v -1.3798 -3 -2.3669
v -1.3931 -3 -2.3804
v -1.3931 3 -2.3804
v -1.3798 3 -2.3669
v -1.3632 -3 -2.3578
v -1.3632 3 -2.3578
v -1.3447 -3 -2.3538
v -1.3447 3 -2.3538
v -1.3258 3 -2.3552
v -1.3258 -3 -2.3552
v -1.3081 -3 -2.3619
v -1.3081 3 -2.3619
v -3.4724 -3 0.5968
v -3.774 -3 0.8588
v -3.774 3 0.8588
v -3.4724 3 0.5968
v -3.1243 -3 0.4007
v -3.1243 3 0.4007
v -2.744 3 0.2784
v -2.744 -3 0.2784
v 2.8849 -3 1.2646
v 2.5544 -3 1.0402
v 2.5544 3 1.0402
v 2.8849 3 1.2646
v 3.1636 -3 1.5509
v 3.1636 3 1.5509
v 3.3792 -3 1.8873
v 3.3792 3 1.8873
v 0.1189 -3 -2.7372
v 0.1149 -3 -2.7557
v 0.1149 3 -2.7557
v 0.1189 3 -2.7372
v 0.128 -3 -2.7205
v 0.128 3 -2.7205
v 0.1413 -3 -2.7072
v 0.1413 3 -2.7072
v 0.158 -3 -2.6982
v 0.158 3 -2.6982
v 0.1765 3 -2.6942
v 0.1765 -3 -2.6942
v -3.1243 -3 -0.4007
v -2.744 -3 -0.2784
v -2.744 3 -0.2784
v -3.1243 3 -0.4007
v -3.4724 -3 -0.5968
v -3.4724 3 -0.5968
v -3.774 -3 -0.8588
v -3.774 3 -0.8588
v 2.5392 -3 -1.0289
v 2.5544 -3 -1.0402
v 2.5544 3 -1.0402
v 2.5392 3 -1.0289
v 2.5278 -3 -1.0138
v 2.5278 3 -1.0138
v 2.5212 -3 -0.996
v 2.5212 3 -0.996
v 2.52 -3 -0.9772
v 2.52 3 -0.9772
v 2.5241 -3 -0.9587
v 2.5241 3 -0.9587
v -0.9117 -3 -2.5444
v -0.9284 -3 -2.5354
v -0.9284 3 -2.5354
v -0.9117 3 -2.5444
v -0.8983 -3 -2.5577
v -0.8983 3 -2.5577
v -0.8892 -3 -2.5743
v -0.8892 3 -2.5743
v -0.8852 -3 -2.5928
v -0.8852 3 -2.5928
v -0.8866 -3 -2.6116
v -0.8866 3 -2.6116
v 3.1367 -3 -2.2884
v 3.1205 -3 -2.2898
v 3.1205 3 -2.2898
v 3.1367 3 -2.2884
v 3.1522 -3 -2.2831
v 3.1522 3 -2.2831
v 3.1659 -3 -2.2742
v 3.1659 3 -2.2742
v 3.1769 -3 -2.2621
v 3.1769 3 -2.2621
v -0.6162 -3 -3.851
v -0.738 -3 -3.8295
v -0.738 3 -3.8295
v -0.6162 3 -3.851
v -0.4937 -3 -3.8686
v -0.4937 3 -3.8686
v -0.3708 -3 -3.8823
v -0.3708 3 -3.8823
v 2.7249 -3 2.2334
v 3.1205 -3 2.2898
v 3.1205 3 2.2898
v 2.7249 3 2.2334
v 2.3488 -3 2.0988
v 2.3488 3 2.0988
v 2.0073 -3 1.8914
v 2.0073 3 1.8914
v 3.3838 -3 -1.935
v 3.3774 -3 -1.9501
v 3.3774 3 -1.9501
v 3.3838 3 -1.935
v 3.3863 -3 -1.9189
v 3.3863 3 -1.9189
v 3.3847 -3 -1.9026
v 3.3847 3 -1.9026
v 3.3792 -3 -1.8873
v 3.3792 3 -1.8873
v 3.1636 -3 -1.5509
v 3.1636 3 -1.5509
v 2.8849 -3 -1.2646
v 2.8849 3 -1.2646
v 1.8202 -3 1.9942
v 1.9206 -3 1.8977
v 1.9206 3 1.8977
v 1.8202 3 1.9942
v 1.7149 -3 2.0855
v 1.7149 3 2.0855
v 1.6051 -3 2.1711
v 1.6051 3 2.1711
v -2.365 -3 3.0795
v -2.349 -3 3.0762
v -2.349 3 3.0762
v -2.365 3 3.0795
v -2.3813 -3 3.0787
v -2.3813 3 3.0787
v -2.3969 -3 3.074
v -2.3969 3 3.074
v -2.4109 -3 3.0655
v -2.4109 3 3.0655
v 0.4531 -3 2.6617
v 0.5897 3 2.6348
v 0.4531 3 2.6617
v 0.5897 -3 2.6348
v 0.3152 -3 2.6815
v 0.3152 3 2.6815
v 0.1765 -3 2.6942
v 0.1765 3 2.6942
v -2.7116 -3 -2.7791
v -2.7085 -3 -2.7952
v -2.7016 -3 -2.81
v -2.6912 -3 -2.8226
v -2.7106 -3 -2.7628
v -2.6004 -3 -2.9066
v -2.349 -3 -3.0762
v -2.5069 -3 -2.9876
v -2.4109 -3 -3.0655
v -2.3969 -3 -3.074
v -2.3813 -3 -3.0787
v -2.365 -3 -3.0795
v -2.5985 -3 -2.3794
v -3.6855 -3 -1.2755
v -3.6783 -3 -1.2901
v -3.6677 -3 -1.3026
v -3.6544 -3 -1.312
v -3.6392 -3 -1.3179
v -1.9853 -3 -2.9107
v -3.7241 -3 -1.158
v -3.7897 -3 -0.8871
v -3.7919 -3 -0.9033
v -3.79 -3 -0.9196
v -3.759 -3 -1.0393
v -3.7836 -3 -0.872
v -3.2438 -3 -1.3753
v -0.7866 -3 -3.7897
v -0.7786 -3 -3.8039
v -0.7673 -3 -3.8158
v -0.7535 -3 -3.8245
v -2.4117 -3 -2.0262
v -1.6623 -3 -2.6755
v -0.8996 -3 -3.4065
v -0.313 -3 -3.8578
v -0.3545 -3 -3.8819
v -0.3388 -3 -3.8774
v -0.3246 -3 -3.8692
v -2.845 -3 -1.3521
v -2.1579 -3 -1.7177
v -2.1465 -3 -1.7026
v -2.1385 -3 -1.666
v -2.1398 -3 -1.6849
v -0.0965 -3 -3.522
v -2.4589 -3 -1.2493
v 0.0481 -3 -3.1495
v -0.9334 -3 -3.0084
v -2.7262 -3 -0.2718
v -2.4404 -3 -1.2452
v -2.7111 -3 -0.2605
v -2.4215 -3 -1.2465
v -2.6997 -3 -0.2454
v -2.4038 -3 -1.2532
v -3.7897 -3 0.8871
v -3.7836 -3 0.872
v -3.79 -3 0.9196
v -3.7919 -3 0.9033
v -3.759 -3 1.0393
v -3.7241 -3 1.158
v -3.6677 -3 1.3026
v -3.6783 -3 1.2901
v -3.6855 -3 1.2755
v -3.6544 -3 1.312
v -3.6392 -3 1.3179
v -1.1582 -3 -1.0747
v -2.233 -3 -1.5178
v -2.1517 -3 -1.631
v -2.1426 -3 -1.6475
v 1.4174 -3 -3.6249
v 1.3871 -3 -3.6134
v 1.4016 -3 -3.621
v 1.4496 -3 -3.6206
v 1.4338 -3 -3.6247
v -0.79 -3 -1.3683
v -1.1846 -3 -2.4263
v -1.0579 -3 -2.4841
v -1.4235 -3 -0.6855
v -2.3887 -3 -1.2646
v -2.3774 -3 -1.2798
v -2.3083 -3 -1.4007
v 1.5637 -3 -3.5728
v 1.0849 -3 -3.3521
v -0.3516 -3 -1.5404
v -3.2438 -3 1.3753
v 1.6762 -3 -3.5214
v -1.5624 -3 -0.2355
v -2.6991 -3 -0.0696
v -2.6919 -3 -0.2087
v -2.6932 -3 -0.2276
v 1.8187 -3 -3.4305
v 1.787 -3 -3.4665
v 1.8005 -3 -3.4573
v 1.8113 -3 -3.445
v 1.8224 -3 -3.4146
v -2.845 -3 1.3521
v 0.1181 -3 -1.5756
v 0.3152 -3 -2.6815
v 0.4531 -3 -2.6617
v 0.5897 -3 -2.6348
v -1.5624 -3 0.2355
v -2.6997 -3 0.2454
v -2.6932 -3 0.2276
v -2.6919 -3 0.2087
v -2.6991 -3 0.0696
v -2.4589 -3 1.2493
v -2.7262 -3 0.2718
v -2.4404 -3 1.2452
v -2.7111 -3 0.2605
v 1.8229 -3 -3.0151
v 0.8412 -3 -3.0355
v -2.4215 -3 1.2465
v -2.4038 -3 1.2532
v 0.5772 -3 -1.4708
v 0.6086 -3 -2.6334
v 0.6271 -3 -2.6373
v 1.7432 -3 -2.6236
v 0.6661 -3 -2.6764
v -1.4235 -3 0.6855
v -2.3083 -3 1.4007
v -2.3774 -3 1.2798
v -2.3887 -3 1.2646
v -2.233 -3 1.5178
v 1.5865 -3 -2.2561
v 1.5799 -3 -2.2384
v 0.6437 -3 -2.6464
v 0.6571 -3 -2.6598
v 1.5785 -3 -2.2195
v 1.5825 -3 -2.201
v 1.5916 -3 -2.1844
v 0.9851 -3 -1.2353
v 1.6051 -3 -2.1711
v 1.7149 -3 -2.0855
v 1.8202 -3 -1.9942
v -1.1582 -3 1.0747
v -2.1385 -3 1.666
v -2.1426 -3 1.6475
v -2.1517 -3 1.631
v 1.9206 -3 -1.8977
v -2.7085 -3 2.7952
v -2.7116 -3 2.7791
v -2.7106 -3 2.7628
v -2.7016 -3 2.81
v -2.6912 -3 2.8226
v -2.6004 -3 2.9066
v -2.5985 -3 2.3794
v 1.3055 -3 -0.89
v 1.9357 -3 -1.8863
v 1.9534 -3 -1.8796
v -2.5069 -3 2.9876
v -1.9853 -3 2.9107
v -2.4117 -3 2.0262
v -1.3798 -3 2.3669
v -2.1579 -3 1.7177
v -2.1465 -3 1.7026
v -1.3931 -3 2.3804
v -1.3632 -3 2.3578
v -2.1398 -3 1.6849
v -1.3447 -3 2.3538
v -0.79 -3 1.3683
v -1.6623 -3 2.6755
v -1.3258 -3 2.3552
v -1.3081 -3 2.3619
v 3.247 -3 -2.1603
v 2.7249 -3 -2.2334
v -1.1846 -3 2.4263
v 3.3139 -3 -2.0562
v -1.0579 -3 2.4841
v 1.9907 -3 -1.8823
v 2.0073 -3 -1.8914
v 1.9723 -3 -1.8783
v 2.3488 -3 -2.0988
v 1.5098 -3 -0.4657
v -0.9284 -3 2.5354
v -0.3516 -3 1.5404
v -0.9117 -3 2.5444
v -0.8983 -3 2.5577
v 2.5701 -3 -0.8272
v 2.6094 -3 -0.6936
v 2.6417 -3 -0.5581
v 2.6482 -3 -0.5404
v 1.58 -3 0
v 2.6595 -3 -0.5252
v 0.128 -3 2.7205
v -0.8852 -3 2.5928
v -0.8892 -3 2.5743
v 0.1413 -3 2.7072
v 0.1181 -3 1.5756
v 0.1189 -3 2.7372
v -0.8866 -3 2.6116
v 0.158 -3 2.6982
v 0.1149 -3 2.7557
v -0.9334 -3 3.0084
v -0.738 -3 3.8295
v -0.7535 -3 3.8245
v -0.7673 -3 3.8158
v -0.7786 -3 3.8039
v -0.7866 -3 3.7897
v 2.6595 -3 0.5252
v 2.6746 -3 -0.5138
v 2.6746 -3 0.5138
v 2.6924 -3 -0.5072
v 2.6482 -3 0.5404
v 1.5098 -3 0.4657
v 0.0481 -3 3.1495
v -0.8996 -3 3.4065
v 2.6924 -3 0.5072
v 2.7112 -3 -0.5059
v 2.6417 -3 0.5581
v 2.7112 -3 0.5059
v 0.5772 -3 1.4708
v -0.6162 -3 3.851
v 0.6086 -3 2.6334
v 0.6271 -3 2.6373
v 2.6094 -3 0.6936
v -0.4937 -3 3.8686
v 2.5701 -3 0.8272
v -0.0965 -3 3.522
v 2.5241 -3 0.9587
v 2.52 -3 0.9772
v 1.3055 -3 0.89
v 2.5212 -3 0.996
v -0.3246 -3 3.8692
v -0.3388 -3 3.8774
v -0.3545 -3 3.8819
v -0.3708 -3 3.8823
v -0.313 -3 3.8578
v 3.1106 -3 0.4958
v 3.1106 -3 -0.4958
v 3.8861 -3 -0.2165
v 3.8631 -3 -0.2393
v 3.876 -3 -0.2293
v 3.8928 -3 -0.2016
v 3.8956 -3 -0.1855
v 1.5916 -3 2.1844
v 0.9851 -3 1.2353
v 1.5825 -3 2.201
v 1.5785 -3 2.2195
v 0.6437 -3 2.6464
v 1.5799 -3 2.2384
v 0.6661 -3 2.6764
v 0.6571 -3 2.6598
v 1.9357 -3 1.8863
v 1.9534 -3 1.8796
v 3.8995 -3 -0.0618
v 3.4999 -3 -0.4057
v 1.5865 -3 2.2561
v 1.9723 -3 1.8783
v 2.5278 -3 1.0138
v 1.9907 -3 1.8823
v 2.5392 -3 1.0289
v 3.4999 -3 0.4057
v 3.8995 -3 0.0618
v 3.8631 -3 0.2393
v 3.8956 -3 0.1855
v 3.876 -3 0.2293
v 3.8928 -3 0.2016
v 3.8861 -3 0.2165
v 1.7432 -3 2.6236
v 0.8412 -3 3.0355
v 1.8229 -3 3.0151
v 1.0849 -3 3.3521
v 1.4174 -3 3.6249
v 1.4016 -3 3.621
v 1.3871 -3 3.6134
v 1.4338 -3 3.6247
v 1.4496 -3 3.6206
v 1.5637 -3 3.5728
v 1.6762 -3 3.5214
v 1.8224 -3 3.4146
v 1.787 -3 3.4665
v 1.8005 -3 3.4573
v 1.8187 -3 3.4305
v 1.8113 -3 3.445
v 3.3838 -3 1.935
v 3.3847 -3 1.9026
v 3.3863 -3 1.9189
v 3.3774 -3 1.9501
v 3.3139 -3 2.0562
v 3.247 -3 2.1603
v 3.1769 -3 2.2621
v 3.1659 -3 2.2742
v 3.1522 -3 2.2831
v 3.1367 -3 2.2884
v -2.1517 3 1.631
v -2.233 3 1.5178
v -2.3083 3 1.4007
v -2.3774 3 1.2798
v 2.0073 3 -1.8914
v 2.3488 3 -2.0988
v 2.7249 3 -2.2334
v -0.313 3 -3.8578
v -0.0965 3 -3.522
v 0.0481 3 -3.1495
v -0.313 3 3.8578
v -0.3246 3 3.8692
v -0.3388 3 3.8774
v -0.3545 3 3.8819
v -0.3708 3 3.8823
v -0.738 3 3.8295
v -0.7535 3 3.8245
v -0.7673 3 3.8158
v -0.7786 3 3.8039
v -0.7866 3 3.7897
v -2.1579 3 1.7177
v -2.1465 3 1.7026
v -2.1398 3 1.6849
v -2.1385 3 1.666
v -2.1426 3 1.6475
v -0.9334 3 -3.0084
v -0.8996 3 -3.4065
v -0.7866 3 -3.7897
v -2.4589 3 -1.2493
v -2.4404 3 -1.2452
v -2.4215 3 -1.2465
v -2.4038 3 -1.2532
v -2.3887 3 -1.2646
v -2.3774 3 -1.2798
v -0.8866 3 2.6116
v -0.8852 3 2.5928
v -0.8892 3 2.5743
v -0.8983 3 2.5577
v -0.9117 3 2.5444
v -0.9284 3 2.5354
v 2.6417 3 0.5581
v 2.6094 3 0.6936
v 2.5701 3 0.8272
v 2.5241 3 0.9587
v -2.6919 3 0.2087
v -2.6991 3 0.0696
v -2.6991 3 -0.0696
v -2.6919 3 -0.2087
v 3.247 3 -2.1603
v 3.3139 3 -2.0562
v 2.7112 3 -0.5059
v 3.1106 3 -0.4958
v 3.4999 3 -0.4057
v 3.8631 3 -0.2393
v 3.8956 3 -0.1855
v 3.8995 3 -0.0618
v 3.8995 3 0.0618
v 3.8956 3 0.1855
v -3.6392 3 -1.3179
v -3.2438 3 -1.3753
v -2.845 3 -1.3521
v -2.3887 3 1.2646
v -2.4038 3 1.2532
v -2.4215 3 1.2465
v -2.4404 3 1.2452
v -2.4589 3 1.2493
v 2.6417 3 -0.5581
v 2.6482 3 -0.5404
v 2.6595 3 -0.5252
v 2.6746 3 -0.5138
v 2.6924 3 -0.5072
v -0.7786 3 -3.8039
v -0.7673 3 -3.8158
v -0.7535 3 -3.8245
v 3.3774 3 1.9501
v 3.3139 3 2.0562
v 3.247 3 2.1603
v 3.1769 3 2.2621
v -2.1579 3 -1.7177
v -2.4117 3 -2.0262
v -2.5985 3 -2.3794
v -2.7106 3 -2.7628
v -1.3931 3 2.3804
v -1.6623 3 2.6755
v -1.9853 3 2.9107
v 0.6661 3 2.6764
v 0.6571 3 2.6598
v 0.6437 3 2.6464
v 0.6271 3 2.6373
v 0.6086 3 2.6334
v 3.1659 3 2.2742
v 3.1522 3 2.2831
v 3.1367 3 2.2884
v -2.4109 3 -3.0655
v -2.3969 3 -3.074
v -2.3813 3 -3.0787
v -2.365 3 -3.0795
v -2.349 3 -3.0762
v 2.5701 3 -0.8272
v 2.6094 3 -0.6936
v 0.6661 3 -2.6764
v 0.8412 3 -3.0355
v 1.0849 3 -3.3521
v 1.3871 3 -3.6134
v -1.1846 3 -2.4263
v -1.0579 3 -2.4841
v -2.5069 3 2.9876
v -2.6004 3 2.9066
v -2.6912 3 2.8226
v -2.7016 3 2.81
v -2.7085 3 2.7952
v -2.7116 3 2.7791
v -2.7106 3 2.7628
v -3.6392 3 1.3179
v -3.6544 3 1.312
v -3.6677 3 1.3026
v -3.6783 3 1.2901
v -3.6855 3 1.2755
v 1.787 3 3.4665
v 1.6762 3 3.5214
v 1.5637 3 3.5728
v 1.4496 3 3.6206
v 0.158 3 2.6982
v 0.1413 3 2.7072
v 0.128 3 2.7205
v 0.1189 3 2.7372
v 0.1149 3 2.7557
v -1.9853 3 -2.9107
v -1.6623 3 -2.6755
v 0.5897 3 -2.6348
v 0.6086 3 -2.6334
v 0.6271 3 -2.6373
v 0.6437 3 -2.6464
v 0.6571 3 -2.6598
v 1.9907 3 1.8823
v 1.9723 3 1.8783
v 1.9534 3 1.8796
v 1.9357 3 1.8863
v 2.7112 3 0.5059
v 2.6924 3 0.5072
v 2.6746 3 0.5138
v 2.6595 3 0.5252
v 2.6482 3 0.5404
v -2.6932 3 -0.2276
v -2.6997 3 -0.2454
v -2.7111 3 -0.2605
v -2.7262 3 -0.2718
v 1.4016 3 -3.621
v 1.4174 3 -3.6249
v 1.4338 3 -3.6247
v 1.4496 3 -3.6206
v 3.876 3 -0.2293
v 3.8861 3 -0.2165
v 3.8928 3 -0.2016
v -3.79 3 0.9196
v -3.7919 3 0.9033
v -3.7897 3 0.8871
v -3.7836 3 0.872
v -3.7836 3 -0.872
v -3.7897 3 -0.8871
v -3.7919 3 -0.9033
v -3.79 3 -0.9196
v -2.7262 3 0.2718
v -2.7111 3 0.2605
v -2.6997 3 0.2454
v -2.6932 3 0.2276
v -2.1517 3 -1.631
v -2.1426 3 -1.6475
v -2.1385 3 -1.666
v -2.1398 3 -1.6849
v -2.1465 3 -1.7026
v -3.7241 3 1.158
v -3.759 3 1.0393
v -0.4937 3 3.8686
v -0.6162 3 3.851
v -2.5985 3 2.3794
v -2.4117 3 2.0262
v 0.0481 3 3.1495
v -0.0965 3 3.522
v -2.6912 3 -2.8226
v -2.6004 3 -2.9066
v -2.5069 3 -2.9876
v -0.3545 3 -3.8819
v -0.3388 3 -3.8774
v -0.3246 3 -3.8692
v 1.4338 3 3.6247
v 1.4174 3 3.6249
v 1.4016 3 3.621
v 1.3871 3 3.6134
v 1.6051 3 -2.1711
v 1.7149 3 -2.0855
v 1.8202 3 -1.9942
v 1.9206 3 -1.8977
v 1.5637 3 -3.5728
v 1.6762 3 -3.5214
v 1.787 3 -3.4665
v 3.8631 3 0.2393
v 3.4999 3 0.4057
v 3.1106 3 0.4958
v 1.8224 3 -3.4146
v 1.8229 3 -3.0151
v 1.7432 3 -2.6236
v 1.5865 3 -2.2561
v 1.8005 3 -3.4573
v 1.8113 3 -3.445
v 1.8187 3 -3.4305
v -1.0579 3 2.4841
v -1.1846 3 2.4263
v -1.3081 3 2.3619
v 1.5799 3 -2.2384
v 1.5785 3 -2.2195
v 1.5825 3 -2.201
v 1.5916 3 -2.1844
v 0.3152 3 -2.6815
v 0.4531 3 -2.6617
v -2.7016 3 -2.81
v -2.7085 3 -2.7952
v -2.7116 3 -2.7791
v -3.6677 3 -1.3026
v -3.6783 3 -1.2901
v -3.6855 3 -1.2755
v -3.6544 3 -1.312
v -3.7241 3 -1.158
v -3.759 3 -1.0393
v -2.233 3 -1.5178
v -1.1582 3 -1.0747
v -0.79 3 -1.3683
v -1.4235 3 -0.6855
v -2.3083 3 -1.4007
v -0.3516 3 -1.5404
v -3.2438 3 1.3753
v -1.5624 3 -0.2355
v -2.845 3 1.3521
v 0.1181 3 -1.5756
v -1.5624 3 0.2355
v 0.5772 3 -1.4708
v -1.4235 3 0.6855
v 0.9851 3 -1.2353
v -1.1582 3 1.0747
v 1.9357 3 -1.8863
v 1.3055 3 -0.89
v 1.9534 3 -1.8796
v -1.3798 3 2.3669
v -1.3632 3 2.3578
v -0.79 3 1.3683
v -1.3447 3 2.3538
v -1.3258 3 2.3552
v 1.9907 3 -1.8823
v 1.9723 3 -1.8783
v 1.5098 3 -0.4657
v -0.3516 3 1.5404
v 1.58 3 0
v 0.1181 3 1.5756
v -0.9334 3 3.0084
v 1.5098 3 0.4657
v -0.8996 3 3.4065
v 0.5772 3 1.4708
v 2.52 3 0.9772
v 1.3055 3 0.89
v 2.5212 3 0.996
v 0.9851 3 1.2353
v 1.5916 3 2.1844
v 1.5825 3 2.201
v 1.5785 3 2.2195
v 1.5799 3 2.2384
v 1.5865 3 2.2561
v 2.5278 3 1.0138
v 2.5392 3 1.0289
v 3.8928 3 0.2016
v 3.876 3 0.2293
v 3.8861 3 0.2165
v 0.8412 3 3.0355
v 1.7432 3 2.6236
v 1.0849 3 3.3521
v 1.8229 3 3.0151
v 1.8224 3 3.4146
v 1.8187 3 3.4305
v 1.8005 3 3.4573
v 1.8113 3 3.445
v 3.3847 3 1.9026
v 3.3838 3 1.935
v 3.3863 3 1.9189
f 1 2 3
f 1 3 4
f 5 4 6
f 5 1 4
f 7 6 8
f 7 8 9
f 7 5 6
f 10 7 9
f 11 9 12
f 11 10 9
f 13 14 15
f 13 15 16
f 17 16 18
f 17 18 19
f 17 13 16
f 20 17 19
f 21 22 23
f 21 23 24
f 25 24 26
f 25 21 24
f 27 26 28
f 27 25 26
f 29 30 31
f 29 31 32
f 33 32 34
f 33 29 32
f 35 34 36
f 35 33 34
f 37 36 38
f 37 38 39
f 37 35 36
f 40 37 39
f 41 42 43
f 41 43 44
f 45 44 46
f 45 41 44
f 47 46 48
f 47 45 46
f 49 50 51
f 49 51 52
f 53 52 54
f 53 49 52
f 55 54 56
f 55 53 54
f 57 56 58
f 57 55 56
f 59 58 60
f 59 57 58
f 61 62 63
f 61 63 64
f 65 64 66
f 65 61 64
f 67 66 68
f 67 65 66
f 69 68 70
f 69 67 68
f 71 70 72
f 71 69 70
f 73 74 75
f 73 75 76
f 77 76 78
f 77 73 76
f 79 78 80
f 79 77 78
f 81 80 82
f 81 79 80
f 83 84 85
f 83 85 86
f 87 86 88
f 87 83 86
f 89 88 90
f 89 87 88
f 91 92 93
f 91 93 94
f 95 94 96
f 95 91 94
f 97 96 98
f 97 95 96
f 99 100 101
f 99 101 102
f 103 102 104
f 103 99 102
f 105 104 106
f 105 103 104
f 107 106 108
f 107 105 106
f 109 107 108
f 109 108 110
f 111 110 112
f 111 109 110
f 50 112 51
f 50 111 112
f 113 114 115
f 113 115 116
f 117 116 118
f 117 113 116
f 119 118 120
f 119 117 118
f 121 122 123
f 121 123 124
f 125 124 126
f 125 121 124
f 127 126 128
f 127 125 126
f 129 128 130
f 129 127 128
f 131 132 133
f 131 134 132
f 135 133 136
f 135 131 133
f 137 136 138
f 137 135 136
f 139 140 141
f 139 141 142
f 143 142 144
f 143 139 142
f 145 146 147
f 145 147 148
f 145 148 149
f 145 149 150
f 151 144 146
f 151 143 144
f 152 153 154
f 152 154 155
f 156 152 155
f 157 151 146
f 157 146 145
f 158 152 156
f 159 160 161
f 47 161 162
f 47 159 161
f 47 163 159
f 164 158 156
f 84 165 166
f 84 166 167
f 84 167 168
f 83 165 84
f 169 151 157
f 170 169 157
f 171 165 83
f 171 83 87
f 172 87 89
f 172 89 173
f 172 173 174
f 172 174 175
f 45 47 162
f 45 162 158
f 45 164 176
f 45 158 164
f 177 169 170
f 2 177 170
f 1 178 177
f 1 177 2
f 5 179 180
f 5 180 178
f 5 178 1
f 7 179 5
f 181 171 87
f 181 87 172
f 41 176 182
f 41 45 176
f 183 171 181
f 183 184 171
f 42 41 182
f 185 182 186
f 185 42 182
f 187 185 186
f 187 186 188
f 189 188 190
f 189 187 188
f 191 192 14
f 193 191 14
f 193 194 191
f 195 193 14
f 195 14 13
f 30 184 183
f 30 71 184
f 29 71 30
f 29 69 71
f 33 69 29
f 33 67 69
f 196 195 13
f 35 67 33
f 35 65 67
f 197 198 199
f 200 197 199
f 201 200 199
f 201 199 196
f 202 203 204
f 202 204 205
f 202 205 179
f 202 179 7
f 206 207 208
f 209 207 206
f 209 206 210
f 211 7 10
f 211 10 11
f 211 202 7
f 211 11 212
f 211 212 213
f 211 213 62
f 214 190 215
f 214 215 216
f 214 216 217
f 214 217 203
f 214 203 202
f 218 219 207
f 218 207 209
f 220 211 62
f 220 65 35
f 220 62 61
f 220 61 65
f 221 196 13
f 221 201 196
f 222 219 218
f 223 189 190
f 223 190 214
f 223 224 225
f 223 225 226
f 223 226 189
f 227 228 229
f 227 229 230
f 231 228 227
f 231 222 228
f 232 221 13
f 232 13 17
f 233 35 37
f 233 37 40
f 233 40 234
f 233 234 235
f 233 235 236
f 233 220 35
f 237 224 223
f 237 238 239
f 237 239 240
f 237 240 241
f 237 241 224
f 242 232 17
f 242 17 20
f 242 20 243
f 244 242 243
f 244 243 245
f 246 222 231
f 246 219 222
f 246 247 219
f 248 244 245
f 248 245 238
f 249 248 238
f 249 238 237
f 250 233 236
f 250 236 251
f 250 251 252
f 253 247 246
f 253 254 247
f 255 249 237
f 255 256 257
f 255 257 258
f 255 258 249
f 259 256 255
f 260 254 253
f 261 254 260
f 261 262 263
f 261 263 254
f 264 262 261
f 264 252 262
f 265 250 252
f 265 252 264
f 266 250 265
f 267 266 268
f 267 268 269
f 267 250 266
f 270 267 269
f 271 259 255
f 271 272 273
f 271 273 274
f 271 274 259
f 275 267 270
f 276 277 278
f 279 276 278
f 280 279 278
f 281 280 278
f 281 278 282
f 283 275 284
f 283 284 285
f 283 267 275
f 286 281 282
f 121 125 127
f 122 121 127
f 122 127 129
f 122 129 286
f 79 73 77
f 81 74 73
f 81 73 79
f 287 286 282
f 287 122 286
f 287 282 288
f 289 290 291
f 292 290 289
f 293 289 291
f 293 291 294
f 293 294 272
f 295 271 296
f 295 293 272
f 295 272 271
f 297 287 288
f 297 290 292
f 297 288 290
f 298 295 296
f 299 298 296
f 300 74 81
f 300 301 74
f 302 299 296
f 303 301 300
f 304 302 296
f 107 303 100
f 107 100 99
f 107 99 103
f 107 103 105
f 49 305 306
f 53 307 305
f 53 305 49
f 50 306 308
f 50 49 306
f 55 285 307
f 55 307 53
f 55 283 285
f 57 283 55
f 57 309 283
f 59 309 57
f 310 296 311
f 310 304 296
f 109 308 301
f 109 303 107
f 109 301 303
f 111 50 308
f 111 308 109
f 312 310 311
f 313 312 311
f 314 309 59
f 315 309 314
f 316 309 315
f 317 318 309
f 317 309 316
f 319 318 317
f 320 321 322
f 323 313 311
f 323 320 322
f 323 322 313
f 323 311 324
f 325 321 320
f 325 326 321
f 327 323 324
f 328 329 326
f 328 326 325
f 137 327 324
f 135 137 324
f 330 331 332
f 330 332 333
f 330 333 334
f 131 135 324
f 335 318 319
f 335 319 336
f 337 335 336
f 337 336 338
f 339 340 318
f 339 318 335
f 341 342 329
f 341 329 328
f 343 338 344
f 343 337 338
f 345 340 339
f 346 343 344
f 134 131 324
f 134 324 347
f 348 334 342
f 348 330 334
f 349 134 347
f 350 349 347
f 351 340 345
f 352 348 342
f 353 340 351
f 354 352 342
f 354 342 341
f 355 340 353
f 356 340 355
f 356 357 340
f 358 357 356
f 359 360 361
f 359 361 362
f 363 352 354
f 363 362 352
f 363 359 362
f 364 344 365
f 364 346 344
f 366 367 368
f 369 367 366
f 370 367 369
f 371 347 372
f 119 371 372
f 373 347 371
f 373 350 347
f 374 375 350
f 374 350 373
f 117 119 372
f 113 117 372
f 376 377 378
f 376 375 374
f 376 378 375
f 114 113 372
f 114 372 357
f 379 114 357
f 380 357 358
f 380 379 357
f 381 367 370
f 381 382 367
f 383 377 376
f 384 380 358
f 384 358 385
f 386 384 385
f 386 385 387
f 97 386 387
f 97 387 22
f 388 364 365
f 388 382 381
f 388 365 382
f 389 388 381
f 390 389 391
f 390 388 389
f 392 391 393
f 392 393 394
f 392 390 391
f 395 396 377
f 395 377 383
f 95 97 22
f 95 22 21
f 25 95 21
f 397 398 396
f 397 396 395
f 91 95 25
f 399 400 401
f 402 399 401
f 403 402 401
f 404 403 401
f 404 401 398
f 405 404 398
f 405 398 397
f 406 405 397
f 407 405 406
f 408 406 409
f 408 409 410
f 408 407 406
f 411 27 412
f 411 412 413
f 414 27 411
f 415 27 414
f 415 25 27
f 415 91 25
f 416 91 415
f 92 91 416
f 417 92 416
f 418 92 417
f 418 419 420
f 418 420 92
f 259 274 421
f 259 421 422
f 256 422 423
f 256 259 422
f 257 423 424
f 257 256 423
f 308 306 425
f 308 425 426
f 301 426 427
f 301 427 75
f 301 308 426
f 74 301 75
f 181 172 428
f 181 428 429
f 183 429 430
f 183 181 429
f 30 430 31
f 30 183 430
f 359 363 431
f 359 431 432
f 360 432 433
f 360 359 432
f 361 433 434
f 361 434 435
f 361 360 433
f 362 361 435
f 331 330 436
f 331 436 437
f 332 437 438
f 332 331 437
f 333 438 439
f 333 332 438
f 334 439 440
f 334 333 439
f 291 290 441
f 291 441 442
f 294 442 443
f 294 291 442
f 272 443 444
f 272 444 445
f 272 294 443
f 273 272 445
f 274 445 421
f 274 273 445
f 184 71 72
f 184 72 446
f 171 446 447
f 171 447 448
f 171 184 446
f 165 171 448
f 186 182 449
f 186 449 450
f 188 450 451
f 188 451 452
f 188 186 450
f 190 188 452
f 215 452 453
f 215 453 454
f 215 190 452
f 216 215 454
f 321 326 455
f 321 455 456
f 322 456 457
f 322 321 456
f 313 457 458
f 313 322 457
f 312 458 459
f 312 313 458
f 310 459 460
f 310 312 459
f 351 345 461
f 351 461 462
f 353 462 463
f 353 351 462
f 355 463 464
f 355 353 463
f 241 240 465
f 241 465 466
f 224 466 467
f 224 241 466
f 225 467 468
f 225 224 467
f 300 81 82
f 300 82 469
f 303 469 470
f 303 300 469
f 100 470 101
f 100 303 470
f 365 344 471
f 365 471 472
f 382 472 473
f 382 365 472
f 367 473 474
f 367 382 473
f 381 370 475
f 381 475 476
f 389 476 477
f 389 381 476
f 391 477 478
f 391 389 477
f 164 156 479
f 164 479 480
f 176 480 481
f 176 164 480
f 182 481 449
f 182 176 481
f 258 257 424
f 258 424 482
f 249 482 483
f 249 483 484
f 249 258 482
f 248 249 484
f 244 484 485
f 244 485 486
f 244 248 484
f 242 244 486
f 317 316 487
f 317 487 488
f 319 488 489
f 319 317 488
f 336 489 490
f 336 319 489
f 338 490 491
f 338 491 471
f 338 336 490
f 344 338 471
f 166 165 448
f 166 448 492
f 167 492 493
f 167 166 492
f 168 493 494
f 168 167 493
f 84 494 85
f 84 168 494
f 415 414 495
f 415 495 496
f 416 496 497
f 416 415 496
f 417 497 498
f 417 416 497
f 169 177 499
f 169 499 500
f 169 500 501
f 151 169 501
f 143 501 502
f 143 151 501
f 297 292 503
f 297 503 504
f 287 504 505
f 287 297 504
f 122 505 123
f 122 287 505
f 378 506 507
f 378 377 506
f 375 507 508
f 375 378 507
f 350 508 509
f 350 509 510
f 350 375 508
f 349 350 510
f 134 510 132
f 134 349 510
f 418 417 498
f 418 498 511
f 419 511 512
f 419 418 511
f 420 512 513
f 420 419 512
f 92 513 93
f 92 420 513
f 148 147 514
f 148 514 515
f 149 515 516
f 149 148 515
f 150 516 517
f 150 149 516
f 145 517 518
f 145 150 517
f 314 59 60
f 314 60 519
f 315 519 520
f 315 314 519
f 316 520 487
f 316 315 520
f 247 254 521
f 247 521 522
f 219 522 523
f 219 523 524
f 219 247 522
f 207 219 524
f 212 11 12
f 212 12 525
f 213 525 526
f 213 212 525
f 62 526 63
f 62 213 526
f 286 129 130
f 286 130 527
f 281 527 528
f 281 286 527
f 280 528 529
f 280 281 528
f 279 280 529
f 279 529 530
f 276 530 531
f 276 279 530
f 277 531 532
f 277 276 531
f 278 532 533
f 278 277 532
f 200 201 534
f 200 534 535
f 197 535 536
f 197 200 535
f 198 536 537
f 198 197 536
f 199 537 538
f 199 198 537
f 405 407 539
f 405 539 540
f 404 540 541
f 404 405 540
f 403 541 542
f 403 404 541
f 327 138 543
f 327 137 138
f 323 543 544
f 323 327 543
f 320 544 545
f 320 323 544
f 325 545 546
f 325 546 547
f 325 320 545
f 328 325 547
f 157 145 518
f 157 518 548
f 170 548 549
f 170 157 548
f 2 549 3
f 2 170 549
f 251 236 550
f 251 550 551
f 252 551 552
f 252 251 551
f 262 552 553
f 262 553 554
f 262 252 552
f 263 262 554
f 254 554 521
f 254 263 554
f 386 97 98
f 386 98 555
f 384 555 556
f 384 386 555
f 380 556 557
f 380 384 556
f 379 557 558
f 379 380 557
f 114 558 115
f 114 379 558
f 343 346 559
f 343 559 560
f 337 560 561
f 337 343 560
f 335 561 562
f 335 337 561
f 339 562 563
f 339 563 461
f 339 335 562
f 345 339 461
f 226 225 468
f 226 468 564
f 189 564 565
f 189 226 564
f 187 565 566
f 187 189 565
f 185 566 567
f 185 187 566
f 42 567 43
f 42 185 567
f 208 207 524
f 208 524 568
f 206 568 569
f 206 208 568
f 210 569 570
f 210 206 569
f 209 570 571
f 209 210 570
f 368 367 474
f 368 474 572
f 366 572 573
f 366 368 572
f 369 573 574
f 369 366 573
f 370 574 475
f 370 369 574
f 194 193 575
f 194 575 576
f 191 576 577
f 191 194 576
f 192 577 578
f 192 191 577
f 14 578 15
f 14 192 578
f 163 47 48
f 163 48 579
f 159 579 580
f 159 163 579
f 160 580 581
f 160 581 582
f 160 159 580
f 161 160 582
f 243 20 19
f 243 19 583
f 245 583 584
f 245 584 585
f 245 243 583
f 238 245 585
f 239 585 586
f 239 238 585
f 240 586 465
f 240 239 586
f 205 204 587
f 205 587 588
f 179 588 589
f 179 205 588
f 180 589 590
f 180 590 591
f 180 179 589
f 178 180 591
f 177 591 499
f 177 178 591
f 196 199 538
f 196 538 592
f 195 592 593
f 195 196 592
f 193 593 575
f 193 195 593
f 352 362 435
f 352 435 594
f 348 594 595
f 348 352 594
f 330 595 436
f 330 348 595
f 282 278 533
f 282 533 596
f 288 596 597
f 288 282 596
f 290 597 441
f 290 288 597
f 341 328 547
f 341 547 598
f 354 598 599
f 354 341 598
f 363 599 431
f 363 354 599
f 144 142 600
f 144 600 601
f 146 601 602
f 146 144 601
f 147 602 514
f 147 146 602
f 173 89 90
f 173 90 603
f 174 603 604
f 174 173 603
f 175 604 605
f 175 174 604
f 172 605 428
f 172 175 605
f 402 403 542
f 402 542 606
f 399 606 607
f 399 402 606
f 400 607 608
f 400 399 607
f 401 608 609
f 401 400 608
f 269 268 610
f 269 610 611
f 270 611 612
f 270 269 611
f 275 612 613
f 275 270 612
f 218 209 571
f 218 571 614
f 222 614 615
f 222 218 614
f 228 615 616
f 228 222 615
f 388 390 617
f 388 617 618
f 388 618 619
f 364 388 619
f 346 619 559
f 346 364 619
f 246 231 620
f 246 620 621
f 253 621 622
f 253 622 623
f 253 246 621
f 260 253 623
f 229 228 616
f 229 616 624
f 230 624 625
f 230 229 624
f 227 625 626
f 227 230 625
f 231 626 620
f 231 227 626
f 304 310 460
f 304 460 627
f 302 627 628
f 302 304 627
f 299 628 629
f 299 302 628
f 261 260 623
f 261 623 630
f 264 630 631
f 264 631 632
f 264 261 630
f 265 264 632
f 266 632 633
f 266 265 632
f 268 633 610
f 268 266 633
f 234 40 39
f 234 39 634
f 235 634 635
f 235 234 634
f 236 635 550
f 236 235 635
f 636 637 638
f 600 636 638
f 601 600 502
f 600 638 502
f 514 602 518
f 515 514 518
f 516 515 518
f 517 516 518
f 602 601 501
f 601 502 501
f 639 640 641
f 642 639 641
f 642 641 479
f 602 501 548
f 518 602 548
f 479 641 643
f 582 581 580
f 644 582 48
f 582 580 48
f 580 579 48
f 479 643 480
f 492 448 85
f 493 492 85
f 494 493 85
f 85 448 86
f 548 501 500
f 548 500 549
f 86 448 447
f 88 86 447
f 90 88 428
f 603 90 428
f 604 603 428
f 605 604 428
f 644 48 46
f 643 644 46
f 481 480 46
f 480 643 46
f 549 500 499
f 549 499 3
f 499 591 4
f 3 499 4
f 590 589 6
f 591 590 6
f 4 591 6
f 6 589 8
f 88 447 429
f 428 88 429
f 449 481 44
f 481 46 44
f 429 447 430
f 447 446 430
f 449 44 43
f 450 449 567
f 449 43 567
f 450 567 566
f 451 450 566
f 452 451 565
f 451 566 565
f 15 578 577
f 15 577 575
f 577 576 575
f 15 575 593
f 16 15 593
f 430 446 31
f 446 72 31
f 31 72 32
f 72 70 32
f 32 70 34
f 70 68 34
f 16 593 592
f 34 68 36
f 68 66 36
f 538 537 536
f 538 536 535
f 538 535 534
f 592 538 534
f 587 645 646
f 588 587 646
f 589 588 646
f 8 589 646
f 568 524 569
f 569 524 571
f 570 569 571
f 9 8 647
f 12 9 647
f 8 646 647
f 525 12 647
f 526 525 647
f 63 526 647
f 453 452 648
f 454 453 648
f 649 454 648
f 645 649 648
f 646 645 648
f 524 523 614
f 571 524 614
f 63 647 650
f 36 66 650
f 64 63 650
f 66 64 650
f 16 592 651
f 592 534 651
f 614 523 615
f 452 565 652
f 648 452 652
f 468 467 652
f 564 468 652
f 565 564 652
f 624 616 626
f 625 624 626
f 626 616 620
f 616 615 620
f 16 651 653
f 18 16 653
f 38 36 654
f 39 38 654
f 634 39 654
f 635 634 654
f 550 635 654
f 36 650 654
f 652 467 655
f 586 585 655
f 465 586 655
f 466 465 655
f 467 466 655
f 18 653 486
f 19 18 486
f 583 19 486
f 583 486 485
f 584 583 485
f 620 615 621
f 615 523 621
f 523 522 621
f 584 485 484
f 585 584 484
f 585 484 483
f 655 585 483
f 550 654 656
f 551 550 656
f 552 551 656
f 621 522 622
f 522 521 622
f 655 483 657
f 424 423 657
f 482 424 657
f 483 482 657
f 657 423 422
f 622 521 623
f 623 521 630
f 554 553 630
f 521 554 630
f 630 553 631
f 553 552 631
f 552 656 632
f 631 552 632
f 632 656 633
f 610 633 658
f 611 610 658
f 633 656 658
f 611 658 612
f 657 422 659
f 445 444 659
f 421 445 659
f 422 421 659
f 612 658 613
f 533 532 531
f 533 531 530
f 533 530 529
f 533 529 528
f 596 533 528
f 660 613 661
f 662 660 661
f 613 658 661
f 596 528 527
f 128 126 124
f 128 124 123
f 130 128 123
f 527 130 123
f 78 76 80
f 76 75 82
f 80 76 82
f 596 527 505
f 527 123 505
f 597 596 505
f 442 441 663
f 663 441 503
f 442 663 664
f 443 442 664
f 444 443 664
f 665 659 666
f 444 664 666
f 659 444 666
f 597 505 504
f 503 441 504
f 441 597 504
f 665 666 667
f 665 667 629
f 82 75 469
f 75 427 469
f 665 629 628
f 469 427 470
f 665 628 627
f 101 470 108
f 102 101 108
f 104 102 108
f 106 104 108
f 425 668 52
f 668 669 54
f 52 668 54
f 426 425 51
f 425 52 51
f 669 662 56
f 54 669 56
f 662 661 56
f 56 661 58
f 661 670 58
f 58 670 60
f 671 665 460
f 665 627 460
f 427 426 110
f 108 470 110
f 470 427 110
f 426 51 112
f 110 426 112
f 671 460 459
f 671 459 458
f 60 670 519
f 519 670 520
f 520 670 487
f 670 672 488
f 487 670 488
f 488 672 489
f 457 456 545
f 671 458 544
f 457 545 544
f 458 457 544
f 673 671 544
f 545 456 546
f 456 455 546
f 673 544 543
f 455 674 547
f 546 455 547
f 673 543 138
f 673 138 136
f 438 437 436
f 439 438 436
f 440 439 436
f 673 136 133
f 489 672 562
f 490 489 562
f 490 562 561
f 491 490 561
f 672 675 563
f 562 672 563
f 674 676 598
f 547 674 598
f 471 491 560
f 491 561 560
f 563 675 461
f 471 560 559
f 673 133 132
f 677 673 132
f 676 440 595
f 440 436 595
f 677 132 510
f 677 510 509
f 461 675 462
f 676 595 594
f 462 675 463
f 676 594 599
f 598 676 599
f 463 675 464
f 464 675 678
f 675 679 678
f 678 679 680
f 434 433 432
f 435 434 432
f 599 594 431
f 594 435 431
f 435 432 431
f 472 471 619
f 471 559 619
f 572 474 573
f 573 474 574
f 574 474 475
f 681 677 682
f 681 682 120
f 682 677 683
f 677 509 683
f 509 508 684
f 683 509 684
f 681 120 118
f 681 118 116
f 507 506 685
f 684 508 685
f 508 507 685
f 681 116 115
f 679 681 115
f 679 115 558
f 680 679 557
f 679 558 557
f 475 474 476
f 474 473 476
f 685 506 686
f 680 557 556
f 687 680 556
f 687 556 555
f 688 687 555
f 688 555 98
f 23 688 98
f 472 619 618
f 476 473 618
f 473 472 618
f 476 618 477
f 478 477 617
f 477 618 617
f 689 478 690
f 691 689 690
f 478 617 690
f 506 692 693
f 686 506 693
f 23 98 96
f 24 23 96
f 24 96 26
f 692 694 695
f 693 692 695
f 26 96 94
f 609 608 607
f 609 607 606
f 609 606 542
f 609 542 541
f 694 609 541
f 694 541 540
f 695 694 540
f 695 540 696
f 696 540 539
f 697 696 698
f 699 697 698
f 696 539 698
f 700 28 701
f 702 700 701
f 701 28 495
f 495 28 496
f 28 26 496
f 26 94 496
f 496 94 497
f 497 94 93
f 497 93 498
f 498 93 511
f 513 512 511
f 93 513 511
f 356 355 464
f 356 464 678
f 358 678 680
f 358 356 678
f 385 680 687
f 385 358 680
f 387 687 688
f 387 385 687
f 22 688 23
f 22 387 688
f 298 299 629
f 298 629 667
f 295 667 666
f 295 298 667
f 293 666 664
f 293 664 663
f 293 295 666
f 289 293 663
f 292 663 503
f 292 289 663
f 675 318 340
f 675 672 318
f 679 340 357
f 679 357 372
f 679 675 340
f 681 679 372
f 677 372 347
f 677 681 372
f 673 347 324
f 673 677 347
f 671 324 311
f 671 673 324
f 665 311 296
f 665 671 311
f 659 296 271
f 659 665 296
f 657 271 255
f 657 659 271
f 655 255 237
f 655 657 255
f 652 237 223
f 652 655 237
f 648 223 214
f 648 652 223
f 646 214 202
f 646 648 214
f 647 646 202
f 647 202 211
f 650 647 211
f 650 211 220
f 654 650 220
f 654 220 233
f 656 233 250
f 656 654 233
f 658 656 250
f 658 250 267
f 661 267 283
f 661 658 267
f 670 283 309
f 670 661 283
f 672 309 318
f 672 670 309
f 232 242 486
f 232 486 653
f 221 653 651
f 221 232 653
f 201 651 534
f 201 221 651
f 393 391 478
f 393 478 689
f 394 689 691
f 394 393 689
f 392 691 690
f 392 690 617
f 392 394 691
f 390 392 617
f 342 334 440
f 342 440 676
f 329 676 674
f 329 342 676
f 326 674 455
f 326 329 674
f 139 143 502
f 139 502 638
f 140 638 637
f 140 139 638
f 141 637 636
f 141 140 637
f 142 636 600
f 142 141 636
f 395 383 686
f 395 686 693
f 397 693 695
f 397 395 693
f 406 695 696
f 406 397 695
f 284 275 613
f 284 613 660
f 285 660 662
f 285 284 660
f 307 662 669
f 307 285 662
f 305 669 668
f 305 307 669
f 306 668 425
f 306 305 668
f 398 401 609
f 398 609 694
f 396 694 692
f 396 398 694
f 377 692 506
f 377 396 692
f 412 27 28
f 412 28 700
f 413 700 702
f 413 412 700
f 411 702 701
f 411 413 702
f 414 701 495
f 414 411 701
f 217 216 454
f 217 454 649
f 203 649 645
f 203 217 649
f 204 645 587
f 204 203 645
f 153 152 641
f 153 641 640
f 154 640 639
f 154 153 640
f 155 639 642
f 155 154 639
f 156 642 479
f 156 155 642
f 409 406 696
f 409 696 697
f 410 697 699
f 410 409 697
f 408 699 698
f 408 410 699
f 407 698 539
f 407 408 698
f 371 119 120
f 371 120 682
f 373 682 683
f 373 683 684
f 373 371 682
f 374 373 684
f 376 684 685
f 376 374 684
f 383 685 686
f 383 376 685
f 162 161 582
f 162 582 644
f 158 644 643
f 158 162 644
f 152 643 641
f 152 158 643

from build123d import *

# Parameters (mm, degrees)
F0_R     = 1.58
F1_DEPTH = 3


with BuildPart() as f1:
    # F0 (on Front) → F1 (new body, symmetric)
    with BuildSketch(Plane.XZ):
        with BuildLine():
            ThreePointArc((0.1764835345, 2.6942259671), (0.1341691164, 2.7133752243), (0.1149463195, 2.7556562852))
            ThreePointArc((0.1149463195, 2.7556562852), (-0.0148204986, 3.3394100657), (-0.3129533658, 3.8577966946))
            ThreePointArc((-0.3129533658, 3.8577966946), (-0.3387771387, 3.8773936836), (-0.3708166587, 3.8823311303))
            ThreePointArc((-0.3708166587, 3.8823311303), (-0.5550278693, 3.8603036233), (-0.7379830973, 3.8295405662))
            ThreePointArc((-0.7379830973, 3.8295405662), (-0.7673337522, 3.8157765449), (-0.786590371, 3.789697974))
            ThreePointArc((-0.786590371, 3.789697974), (-0.9266003718, 3.2083159111), (-0.8866482769, 2.6116487228))
            ThreePointArc((-0.8866482769, 2.6116487228), (-0.8931804641, 2.5656646543), (-0.9283858818, 2.5353697274))
            ThreePointArc((-0.9283858818, 2.5353697274), (-1.1216205351, 2.4560063875), (-1.3081411324, 2.3619413155))
            ThreePointArc((-1.3081411324, 2.3619413155), (-1.7681239817, 2.0405238508), (-2.1517322648, 1.6309654382))
            ThreePointArc((-2.1517322648, 1.6309654382), (-2.2713845386, 1.4597302071), (-2.3774402326, 1.2797569848))
            ThreePointArc((-2.3774402326, 1.2797569848), (-2.5906310288, 0.7606779035), (-2.6919188572, 0.2087411462))
            ThreePointArc((-2.6919188572, 0.2087411462), (-2.7, 0), (-2.6919188572, -0.2087411462))
            ThreePointArc((-2.6919188572, -0.2087411462), (-2.5906310288, -0.7606779035), (-2.3774402326, -1.2797569848))
            ThreePointArc((-2.3774402326, -1.2797569848), (-2.2713845386, -1.4597302071), (-2.1517322648, -1.6309654382))
            ThreePointArc((-2.1517322648, -1.6309654382), (-1.7681239817, -2.0405238508), (-1.3081411324, -2.3619413155))
            ThreePointArc((-1.3081411324, -2.3619413155), (-1.1216205351, -2.4560063875), (-0.9283858818, -2.5353697274))
            ThreePointArc((-0.9283858818, -2.5353697274), (-0.3842500633, -2.6725178931), (0.1764835345, -2.6942259671))
            ThreePointArc((0.1764835345, -2.6942259671), (0.3842500633, -2.6725178931), (0.5897164591, -2.6348120422))
            ThreePointArc((0.5897164591, -2.6348120422), (1.1216205351, -2.4560063875), (1.6050759262, -2.1711129107))
            ThreePointArc((1.6050759262, -2.1711129107), (1.7681239817, -2.0405238508), (1.9205879909, -1.8977201503))
            ThreePointArc((1.9205879909, -1.8977201503), (2.2713845386, -1.4597302071), (2.5240680522, -0.9586868455))
            ThreePointArc((2.5240680522, -0.9586868455), (2.5906310288, -0.7606779035), (2.6416864059, -0.5581155194))
            ThreePointArc((2.6416864059, -0.5581155194), (2.7, 0), (2.6416864059, 0.5581155194))
            ThreePointArc((2.6416864059, 0.5581155194), (2.5906310288, 0.7606779035), (2.5240680522, 0.9586868455))
            ThreePointArc((2.5240680522, 0.9586868455), (2.2713845386, 1.4597302071), (1.9205879909, 1.8977201503))
            ThreePointArc((1.9205879909, 1.8977201503), (1.7681239817, 2.0405238508), (1.6050759262, 2.1711129107))
            ThreePointArc((1.6050759262, 2.1711129107), (1.1216205351, 2.4560063875), (0.5897164591, 2.6348120422))
            ThreePointArc((0.5897164591, 2.6348120422), (0.3842500633, 2.6725178931), (0.1764835345, 2.6942259671))
        make_face()
        Circle(F0_R, mode=Mode.SUBTRACT)
        with BuildLine():
            ThreePointArc((0.6660679051, 2.6764169638), (0.6357118151, 2.6412642707), (0.5897164591, 2.6348120422))
            ThreePointArc((0.5897164591, 2.6348120422), (1.1216205351, 2.4560063875), (1.6050759262, 2.1711129107))
            ThreePointArc((1.6050759262, 2.1711129107), (1.5798316425, 2.2100991926), (1.586519264, 2.256060913))
            ThreePointArc((1.586519264, 2.256060913), (1.7929535909, 2.8173030819), (1.822409234, 3.4145804618))
            ThreePointArc((1.822409234, 3.4145804618), (1.811279826, 3.4450278837), (1.7869958517, 3.4665034005))
            ThreePointArc((1.7869958517, 3.4665034005), (1.6201185507, 3.5475647819), (1.4495750544, 3.6205983154))
            ThreePointArc((1.4495750544, 3.6205983154), (1.4174423205, 3.6248874459), (1.3871434821, 3.6133596702))
            ThreePointArc((1.3871434821, 3.6133596702), (0.9550407005, 3.1999650771), (0.6660679051, 2.6764169638))
        make_face()
        with BuildLine():
            ThreePointArc((2.0073122334, 1.8914417294), (1.9627700848, 1.8782811435), (1.9205879909, 1.8977201503))
            ThreePointArc((1.9205879909, 1.8977201503), (2.2713845386, 1.4597302071), (2.5240680522, 0.9586868455))
            ThreePointArc((2.5240680522, 0.9586868455), (2.5239087847, 1.005132283), (2.554383552, 1.0401821415))
            ThreePointArc((2.554383552, 1.0401821415), (3.0314775838, 1.4007222756), (3.3791697785, 1.8872590586))
            ThreePointArc((3.3791697785, 1.8872590586), (3.3862682438, 1.9188900721), (3.3774498056, 1.9500853342))
            ThreePointArc((3.3774498056, 1.9500853342), (3.280888778, 2.1084991881), (3.1769033686, 2.2621416814))
            ThreePointArc((3.1769033686, 2.2621416814), (3.1521904717, 2.2831221951), (3.1204690807, 2.2898052019))
            ThreePointArc((3.1204690807, 2.2898052019), (2.5334630984, 2.175647941), (2.0073122334, 1.8914417294))
        make_face()
        with BuildLine():
            ThreePointArc((2.7112491106, 0.5059471103), (2.6666627208, 0.5189570245), (2.6416864059, 0.5581155194))
            ThreePointArc((2.6416864059, 0.5581155194), (2.7, 0), (2.6416864059, -0.5581155194))
            ThreePointArc((2.6416864059, -0.5581155194), (2.6666627208, -0.5189570245), (2.7112491106, -0.5059471103))
            ThreePointArc((2.7112491106, -0.5059471103), (3.3075288632, -0.4605779561), (3.8630677944, -0.2392537609))
            ThreePointArc((3.8630677944, -0.2392537609), (3.8861404204, -0.2164817791), (3.8955873101, -0.1854710471))
            ThreePointArc((3.8955873101, -0.1854710471), (3.9, 0), (3.8955873101, 0.1854710471))
            ThreePointArc((3.8955873101, 0.1854710471), (3.8861404204, 0.2164817791), (3.8630677944, 0.2392537609))
            ThreePointArc((3.8630677944, 0.2392537609), (3.3075288632, 0.4605779561), (2.7112491106, 0.5059471103))
        make_face()
        with BuildLine():
            ThreePointArc((-2.1517322648, 1.6309654382), (-1.7681239817, 2.0405238508), (-1.3081411324, 2.3619413155))
            ThreePointArc((-1.3081411324, 2.3619413155), (-1.3540911561, 2.3551737941), (-1.3931212693, 2.3803502573))
            ThreePointArc((-1.3931212693, 2.3803502573), (-1.8178891846, 2.8012779489), (-2.3489554831, 3.0761897348))
            ThreePointArc((-2.3489554831, 3.0761897348), (-2.3812747555, 3.0787143854), (-2.4108975001, 3.0655461575))
            ThreePointArc((-2.4108975001, 3.0655461575), (-2.5539568624, 2.94742334), (-2.69123683, 2.8226307454))
            ThreePointArc((-2.69123683, 2.8226307454), (-2.7084867804, 2.7951835518), (-2.7105873391, 2.7628339478))
            ThreePointArc((-2.7105873391, 2.7628339478), (-2.5140523732, 2.1980491121), (-2.1578598957, 1.7177004654))
            ThreePointArc((-2.1578598957, 1.7177004654), (-2.1384942569, 1.6754846382), (-2.1517322648, 1.6309654382))
        make_face()
        with BuildLine():
            ThreePointArc((2.554383552, -1.0401821415), (2.5239087847, -1.005132283), (2.5240680522, -0.9586868455))
            ThreePointArc((2.5240680522, -0.9586868455), (2.2713845386, -1.4597302071), (1.9205879909, -1.8977201503))
            ThreePointArc((1.9205879909, -1.8977201503), (1.9627700848, -1.8782811435), (2.0073122334, -1.8914417294))
            ThreePointArc((2.0073122334, -1.8914417294), (2.5334630984, -2.175647941), (3.1204690807, -2.2898052019))
            ThreePointArc((3.1204690807, -2.2898052019), (3.1521904717, -2.2831221951), (3.1769033686, -2.2621416814))
            ThreePointArc((3.1769033686, -2.2621416814), (3.280888778, -2.1084991881), (3.3774498056, -1.9500853342))
            ThreePointArc((3.3774498056, -1.9500853342), (3.3862682438, -1.9188900721), (3.3791697785, -1.8872590586))
            ThreePointArc((3.3791697785, -1.8872590586), (3.0314775838, -1.4007222756), (2.554383552, -1.0401821415))
        make_face()
        with BuildLine():
            ThreePointArc((-2.6919188572, 0.2087411462), (-2.5906310288, 0.7606779035), (-2.3774402326, 1.2797569848))
            ThreePointArc((-2.3774402326, 1.2797569848), (-2.4124370542, 1.2492213252), (-2.4588826984, 1.2492998415))
            ThreePointArc((-2.4588826984, 1.2492998415), (-3.043790899, 1.3737598761), (-3.6391808315, 1.3179142695))
            ThreePointArc((-3.6391808315, 1.3179142695), (-3.6677344627, 1.3025650229), (-3.6855354198, 1.2754719398))
            ThreePointArc((-3.6855354198, 1.2754719398), (-3.7420225971, 1.0987569717), (-3.7900418845, 0.9195556068))
            ThreePointArc((-3.7900418845, 0.9195556068), (-3.789714393, 0.8871395309), (-3.7739919791, 0.8587896644))
            ThreePointArc((-3.7739919791, 0.8587896644), (-3.3033105094, 0.4899172508), (-2.7439662444, 0.2783944468))
            ThreePointArc((-2.7439662444, 0.2783944468), (-2.704851233, 0.2533500879), (-2.6919188572, 0.2087411462))
        make_face()
        with BuildLine():
            ThreePointArc((1.586519264, -2.256060913), (1.5798316425, -2.2100991926), (1.6050759262, -2.1711129107))
            ThreePointArc((1.6050759262, -2.1711129107), (1.1216205351, -2.4560063875), (0.5897164591, -2.6348120422))
            ThreePointArc((0.5897164591, -2.6348120422), (0.6357118151, -2.6412642707), (0.6660679051, -2.6764169638))
            ThreePointArc((0.6660679051, -2.6764169638), (0.9550407005, -3.1999650771), (1.3871434821, -3.6133596702))
            ThreePointArc((1.3871434821, -3.6133596702), (1.4174423205, -3.6248874459), (1.4495750544, -3.6205983154))
            ThreePointArc((1.4495750544, -3.6205983154), (1.6201185507, -3.5475647819), (1.7869958517, -3.4665034005))
            ThreePointArc((1.7869958517, -3.4665034005), (1.811279826, -3.4450278837), (1.822409234, -3.4145804618))
            ThreePointArc((1.822409234, -3.4145804618), (1.7929535909, -2.8173030819), (1.586519264, -2.256060913))
        make_face()
        with BuildLine():
            ThreePointArc((-2.3774402326, -1.2797569848), (-2.5906310288, -0.7606779035), (-2.6919188572, -0.2087411462))
            ThreePointArc((-2.6919188572, -0.2087411462), (-2.704851233, -0.2533500879), (-2.7439662444, -0.2783944468))
            ThreePointArc((-2.7439662444, -0.2783944468), (-3.3033105094, -0.4899172508), (-3.7739919791, -0.8587896644))
            ThreePointArc((-3.7739919791, -0.8587896644), (-3.789714393, -0.8871395309), (-3.7900418845, -0.9195556068))
            ThreePointArc((-3.7900418845, -0.9195556068), (-3.7420225971, -1.0987569717), (-3.6855354198, -1.2754719398))
            ThreePointArc((-3.6855354198, -1.2754719398), (-3.6677344627, -1.3025650229), (-3.6391808315, -1.3179142695))
            ThreePointArc((-3.6391808315, -1.3179142695), (-3.043790899, -1.3737598761), (-2.4588826984, -1.2492998415))
            ThreePointArc((-2.4588826984, -1.2492998415), (-2.4124370542, -1.2492213252), (-2.3774402326, -1.2797569848))
        make_face()
        with BuildLine():
            ThreePointArc((0.1149463195, -2.7556562852), (0.1341691164, -2.7133752243), (0.1764835345, -2.6942259671))
            ThreePointArc((0.1764835345, -2.6942259671), (-0.3842500633, -2.6725178931), (-0.9283858818, -2.5353697274))
            ThreePointArc((-0.9283858818, -2.5353697274), (-0.8931804641, -2.5656646543), (-0.8866482769, -2.6116487228))
            ThreePointArc((-0.8866482769, -2.6116487228), (-0.9266003718, -3.2083159111), (-0.786590371, -3.789697974))
            ThreePointArc((-0.786590371, -3.789697974), (-0.7673337522, -3.8157765449), (-0.7379830973, -3.8295405662))
            ThreePointArc((-0.7379830973, -3.8295405662), (-0.5550278693, -3.8603036233), (-0.3708166587, -3.8823311303))
            ThreePointArc((-0.3708166587, -3.8823311303), (-0.3387771387, -3.8773936836), (-0.3129533658, -3.8577966946))
            ThreePointArc((-0.3129533658, -3.8577966946), (-0.0148204986, -3.3394100657), (0.1149463195, -2.7556562852))
        make_face()
        with BuildLine():
            ThreePointArc((-1.3081411324, -2.3619413155), (-1.7681239817, -2.0405238508), (-2.1517322648, -1.6309654382))
            ThreePointArc((-2.1517322648, -1.6309654382), (-2.1384942569, -1.6754846382), (-2.1578598957, -1.7177004654))
            ThreePointArc((-2.1578598957, -1.7177004654), (-2.5140523732, -2.1980491121), (-2.7105873391, -2.7628339478))
            ThreePointArc((-2.7105873391, -2.7628339478), (-2.7084867804, -2.7951835518), (-2.69123683, -2.8226307454))
            ThreePointArc((-2.69123683, -2.8226307454), (-2.5539568624, -2.94742334), (-2.4108975001, -3.0655461575))
            ThreePointArc((-2.4108975001, -3.0655461575), (-2.3812747555, -3.0787143854), (-2.3489554831, -3.0761897348))
            ThreePointArc((-2.3489554831, -3.0761897348), (-1.8178891846, -2.8012779489), (-1.3931212693, -2.3803502573))
            ThreePointArc((-1.3931212693, -2.3803502573), (-1.3540911561, -2.3551737941), (-1.3081411324, -2.3619413155))
        make_face()
    extrude(amount=F1_DEPTH, both=True)


solid = f1.part
